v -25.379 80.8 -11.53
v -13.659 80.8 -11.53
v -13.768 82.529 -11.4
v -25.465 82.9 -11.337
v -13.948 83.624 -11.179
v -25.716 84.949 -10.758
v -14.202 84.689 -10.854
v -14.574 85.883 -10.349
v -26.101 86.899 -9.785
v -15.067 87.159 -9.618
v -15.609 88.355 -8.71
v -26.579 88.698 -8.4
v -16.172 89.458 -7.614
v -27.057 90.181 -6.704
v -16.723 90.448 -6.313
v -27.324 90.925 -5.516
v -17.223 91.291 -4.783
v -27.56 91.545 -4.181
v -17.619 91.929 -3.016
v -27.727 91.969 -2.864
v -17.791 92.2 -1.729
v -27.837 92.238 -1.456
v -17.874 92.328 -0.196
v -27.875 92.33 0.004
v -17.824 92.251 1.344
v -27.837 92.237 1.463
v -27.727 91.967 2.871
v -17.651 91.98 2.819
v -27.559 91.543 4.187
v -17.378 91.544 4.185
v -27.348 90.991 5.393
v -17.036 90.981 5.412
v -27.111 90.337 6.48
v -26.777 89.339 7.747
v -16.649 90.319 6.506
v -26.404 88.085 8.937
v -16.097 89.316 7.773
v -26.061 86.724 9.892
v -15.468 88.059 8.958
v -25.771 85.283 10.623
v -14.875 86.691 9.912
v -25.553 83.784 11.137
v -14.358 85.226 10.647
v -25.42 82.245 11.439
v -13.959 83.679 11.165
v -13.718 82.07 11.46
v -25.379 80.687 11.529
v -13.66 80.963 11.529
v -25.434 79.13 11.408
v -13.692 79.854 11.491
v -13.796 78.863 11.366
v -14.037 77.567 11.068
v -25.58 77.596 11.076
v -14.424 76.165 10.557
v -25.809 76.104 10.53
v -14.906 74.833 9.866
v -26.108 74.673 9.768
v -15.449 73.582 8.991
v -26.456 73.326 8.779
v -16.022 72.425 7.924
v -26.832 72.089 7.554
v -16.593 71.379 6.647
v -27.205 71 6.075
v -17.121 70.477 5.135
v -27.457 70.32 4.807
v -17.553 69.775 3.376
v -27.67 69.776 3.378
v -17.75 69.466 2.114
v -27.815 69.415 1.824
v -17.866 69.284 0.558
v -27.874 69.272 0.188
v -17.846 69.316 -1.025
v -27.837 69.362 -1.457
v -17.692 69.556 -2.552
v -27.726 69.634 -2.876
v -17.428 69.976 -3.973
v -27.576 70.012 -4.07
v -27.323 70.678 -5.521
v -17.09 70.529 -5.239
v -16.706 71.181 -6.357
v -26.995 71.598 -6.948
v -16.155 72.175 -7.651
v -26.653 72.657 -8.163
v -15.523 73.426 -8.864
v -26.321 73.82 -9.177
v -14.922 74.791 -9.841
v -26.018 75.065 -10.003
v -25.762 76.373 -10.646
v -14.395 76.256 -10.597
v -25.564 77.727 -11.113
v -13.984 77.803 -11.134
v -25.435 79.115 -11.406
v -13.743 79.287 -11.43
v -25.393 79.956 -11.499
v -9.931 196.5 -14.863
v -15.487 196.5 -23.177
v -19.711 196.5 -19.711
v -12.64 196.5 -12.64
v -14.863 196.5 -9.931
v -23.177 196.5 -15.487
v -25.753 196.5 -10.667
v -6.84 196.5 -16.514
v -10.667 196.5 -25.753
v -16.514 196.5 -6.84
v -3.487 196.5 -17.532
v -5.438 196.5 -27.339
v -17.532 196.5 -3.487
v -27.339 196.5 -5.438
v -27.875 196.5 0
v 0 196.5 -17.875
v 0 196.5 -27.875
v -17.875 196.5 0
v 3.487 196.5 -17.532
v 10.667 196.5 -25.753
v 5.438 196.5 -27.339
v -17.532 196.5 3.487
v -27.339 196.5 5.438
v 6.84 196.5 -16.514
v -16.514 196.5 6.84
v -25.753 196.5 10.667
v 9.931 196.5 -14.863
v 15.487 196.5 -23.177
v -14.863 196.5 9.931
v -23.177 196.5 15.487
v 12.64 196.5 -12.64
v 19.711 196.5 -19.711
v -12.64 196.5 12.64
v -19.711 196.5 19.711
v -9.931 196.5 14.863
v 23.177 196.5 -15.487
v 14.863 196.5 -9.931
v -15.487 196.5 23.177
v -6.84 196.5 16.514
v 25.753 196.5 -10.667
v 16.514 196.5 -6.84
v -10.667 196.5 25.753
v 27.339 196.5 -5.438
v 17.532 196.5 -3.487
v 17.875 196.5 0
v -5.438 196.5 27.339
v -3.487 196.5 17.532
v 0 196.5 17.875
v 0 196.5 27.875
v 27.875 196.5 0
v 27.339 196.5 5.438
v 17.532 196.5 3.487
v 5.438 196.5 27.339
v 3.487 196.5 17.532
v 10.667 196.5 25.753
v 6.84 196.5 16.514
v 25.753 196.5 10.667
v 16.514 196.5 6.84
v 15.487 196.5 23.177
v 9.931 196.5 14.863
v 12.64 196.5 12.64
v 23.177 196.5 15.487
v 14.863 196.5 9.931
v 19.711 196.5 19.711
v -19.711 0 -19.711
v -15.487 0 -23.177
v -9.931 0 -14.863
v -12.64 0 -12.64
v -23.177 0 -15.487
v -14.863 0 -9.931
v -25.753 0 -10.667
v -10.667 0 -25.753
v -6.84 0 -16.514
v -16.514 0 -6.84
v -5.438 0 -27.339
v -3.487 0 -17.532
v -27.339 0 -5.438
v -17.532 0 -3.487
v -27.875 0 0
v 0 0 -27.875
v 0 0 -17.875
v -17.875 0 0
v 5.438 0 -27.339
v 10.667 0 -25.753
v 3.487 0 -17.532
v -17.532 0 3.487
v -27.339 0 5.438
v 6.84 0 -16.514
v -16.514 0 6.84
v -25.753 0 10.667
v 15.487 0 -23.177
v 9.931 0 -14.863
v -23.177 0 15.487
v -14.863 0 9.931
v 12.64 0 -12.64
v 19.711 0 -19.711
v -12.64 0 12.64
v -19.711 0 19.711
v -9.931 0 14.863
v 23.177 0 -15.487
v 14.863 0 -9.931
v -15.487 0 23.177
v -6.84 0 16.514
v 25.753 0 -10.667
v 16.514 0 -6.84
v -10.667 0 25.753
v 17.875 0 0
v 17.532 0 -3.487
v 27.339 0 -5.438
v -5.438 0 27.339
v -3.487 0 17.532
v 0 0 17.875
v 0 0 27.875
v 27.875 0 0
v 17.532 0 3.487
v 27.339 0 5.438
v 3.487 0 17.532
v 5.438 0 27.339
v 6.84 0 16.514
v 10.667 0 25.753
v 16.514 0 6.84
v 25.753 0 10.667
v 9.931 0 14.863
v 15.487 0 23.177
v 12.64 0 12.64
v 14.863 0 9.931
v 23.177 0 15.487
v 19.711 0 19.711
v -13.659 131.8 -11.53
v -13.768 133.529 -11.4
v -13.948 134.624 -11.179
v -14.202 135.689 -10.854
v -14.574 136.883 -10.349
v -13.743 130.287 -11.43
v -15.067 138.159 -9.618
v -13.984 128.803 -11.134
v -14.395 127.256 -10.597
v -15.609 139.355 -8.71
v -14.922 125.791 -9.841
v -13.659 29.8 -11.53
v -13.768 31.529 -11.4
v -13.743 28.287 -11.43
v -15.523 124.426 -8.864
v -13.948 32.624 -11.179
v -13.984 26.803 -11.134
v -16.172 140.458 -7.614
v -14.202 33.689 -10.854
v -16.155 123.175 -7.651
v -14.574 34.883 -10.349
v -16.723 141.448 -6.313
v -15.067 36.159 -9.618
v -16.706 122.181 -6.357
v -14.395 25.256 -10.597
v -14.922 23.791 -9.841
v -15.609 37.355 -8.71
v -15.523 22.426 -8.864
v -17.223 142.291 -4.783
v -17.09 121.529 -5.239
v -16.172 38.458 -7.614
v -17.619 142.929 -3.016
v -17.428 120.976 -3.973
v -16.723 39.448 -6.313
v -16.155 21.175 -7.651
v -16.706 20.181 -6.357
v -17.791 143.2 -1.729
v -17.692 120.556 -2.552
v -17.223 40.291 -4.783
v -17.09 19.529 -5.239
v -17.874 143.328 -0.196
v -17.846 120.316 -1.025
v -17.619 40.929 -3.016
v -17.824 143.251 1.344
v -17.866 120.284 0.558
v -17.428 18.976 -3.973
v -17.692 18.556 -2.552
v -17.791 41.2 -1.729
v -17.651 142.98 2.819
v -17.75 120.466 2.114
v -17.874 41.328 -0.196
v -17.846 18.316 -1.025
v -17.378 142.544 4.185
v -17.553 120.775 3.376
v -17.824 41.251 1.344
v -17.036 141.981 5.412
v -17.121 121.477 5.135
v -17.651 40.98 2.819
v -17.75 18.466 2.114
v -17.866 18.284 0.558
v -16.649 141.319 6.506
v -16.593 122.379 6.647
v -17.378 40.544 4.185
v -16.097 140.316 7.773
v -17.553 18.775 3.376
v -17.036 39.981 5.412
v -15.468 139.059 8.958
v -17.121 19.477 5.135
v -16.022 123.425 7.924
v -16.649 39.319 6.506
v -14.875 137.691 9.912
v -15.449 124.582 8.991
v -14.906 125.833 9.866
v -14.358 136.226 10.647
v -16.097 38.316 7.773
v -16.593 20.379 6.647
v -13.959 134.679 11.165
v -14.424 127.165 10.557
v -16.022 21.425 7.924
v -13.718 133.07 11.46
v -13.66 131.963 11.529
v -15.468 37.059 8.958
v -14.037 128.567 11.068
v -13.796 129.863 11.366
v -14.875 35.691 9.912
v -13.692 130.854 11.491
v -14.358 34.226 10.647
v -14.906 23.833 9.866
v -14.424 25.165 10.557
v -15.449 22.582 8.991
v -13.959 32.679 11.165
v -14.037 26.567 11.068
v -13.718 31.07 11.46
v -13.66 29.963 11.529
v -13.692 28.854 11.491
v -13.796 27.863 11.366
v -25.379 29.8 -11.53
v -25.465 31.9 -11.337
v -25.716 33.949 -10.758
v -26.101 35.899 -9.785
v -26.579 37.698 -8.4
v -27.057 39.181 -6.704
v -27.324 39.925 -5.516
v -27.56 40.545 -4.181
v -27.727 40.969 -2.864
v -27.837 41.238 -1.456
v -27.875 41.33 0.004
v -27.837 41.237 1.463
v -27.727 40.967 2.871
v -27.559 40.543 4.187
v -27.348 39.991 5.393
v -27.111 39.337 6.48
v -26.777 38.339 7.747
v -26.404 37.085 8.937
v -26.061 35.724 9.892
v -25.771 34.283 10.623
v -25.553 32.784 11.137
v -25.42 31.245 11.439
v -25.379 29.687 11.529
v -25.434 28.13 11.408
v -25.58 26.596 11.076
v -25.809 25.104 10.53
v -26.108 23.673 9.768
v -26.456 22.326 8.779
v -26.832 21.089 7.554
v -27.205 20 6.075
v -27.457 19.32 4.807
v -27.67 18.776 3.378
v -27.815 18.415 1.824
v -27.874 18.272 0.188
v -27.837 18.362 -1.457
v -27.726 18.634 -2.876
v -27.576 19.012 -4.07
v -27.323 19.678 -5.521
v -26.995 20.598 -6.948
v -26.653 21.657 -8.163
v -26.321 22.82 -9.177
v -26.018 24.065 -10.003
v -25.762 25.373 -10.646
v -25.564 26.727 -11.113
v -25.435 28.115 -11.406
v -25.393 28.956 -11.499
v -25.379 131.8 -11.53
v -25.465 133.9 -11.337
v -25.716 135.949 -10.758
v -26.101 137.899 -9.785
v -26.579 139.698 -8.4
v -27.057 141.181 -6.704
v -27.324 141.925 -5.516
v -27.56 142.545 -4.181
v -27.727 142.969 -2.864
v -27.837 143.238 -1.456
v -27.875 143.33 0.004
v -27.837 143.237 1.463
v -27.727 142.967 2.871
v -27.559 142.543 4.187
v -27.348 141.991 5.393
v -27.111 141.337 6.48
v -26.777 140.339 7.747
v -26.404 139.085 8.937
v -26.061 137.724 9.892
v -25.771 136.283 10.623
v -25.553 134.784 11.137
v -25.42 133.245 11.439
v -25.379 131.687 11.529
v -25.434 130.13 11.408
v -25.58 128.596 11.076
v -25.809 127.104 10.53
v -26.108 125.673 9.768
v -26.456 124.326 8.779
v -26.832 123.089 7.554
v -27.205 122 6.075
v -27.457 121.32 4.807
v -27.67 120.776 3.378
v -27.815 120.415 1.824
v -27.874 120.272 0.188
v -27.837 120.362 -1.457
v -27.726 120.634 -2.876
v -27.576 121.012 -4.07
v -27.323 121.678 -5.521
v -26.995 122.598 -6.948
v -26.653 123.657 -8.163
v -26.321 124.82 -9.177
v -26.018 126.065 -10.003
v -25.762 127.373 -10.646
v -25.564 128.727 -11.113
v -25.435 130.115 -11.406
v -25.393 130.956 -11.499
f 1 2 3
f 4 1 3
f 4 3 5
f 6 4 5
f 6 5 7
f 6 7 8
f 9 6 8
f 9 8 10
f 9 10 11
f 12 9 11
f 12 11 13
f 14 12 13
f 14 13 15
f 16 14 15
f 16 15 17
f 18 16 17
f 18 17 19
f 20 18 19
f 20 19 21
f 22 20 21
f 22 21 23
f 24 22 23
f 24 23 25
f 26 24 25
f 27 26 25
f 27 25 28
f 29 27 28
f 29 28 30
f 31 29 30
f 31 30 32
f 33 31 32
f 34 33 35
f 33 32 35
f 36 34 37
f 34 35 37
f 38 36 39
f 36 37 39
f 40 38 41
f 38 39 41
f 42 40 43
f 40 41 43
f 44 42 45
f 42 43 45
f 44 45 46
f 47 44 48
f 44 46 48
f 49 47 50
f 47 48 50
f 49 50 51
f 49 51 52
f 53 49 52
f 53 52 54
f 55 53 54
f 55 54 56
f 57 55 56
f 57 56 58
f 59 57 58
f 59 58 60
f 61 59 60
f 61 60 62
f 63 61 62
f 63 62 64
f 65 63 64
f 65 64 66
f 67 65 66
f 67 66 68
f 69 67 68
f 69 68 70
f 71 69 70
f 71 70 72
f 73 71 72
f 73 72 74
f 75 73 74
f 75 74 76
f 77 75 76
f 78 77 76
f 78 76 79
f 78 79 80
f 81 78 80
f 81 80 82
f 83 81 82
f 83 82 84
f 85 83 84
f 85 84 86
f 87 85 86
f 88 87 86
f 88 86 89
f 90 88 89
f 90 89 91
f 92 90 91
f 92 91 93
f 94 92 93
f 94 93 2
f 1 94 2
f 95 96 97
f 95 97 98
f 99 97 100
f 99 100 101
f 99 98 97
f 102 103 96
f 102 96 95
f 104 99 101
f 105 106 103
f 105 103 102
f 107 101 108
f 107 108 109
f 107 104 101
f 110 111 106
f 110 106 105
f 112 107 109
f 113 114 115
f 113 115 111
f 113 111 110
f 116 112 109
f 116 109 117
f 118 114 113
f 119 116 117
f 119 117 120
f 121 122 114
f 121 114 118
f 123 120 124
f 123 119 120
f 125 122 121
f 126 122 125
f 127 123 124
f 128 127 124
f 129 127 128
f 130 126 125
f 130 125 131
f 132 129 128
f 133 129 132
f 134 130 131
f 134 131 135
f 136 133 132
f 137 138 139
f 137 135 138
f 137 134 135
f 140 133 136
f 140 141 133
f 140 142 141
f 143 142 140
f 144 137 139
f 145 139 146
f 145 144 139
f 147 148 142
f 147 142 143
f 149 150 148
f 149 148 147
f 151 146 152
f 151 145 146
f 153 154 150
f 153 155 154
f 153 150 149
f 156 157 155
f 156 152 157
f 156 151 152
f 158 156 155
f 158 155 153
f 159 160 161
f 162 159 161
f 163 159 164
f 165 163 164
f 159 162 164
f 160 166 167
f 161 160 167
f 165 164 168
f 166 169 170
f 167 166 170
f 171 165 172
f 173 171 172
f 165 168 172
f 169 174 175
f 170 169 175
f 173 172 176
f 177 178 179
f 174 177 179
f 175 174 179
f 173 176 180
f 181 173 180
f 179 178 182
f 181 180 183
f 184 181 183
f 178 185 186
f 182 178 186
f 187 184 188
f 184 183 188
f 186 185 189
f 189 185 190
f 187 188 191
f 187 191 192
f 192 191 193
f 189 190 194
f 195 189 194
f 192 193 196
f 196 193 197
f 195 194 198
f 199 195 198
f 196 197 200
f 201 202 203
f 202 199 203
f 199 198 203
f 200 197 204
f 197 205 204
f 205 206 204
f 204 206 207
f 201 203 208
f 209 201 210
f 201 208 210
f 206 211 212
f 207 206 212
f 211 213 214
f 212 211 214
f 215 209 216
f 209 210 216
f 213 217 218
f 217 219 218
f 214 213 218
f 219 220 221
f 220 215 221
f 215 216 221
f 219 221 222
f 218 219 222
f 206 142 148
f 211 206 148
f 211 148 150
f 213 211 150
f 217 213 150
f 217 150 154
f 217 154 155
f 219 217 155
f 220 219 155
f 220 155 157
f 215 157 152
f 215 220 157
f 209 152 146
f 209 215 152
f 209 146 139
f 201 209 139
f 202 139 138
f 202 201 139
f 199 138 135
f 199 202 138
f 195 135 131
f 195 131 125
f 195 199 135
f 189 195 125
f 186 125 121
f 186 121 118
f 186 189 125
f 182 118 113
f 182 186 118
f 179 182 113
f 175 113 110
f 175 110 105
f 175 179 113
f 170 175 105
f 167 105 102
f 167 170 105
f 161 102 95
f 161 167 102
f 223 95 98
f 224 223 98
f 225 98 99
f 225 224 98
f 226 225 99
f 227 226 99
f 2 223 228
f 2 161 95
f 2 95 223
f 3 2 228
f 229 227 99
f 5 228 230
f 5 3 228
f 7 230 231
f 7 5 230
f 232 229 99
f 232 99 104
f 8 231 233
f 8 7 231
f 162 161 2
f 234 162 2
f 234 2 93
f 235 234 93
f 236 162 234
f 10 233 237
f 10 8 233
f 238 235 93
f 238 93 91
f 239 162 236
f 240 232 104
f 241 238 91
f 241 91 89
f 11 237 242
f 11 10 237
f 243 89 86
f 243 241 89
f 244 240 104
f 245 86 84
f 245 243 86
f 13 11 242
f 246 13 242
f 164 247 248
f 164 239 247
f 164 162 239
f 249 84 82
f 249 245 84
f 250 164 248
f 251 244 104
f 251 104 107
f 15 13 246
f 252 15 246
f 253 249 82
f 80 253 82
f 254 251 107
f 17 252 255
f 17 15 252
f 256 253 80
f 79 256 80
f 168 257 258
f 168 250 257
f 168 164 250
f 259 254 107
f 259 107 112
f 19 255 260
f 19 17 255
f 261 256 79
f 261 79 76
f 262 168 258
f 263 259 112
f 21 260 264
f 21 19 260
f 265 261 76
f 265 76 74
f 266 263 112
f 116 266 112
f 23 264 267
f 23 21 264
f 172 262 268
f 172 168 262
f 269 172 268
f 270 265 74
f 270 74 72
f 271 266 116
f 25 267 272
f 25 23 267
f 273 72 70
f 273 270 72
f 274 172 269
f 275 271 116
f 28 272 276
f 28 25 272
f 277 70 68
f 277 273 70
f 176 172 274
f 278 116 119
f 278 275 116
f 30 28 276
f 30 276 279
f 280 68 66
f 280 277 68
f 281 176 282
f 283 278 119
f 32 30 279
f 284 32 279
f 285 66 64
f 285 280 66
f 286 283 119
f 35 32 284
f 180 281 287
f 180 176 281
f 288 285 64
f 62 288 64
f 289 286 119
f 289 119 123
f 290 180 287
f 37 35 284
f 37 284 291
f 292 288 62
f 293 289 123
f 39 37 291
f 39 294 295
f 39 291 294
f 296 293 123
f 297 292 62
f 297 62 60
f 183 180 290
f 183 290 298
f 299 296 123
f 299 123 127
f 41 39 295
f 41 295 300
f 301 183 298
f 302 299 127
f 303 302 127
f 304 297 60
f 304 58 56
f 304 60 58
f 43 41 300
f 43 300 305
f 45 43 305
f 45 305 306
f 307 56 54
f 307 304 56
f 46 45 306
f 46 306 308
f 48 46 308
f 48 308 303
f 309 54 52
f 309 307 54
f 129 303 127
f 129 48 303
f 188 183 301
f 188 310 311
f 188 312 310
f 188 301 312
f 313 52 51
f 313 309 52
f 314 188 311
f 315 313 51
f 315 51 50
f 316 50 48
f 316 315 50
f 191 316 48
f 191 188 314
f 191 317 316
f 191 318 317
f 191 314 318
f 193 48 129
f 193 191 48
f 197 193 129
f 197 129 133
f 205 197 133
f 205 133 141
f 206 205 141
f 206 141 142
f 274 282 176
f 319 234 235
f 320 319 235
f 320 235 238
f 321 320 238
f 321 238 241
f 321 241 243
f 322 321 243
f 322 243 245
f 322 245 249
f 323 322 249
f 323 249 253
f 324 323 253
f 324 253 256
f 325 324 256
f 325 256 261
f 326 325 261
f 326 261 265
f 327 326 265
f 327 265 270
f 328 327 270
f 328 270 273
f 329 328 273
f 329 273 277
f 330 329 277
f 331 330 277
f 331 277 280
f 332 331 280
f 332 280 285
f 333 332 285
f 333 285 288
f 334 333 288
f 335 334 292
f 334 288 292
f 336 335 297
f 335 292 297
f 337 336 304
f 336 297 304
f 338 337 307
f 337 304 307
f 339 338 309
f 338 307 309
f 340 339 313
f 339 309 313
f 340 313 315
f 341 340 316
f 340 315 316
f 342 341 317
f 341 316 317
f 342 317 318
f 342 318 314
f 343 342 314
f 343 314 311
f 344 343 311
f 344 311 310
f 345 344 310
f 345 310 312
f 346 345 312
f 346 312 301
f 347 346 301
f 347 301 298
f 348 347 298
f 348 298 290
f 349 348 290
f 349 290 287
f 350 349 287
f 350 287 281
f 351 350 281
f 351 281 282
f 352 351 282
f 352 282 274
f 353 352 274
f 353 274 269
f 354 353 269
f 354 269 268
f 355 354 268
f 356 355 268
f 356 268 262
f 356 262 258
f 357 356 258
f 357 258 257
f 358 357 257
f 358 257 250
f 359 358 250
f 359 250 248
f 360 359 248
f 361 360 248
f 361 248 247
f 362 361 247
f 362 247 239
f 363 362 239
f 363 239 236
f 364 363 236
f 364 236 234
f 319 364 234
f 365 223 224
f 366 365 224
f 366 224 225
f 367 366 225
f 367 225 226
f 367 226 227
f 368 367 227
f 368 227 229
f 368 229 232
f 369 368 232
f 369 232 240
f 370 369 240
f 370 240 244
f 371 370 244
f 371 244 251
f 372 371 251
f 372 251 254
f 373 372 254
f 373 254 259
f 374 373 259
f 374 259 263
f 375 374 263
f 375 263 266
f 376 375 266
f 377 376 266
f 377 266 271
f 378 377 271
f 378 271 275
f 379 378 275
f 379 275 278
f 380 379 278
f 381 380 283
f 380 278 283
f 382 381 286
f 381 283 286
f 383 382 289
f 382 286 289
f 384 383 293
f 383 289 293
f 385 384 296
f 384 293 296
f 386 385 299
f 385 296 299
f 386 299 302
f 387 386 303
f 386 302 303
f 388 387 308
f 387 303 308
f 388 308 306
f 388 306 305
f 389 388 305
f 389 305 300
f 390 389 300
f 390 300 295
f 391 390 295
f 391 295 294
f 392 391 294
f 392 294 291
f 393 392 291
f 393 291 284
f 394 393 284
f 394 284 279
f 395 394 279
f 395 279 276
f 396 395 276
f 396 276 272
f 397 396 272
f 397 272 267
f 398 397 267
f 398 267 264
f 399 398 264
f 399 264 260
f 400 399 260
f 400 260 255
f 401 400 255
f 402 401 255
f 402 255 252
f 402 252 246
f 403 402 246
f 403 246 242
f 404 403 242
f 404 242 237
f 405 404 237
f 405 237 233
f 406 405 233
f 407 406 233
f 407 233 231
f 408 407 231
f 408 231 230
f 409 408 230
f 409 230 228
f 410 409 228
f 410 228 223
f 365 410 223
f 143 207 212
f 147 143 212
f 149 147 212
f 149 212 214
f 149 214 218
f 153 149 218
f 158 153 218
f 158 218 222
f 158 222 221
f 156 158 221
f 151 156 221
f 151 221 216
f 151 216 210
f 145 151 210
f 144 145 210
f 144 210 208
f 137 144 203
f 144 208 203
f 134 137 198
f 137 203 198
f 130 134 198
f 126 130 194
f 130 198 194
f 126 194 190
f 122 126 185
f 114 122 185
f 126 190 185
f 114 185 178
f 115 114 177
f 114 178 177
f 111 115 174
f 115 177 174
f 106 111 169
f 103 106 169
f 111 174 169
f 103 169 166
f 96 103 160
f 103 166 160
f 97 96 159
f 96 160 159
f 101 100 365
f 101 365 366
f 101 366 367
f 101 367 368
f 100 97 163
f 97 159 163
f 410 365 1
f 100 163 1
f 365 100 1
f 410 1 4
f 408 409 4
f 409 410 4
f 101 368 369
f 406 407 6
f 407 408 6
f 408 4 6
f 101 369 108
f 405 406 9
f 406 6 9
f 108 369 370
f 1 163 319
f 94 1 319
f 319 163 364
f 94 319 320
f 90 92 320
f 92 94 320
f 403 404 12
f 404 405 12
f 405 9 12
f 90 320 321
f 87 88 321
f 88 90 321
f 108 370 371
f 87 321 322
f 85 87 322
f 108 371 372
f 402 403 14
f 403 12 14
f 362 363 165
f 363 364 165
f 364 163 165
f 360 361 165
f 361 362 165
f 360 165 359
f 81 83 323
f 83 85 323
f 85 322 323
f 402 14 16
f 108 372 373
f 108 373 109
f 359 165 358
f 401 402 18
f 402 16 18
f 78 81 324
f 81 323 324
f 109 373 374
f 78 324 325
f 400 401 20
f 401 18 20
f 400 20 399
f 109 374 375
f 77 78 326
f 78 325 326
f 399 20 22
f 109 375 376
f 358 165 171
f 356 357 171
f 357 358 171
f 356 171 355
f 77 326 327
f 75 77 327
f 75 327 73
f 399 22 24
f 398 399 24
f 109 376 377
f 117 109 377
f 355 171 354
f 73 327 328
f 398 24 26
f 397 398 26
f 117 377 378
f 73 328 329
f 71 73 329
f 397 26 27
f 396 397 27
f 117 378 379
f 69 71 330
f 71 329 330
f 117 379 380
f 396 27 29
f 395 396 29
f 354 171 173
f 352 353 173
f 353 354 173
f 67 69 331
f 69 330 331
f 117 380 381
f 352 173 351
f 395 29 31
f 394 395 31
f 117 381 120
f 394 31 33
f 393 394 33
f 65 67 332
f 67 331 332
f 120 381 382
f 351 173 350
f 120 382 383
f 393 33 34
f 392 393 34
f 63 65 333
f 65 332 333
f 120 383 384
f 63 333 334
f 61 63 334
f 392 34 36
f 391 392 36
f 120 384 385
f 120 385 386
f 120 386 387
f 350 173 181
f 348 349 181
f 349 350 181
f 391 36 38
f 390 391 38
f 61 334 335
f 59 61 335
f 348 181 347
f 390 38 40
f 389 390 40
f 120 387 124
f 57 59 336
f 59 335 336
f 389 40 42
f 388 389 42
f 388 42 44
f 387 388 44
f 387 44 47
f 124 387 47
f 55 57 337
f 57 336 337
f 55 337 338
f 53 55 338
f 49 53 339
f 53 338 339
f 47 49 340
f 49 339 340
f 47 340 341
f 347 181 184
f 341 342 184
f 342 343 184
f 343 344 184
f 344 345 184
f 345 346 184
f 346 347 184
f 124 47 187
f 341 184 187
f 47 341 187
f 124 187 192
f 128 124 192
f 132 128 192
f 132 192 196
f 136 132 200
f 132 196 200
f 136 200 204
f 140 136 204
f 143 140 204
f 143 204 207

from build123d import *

# Parameters (mm, degrees)
SKETCH1_R           = 27.875
SKETCH1_R_2         = 17.875
BOSS_EXTRUDE1_DEPTH = 196.5
SKETCH2_R           = 11.53
CUT_EXTRUDE1_DEPTH  = 201.415271998


with BuildPart() as part:
    # Sketch1 → Boss-Extrude1 (new body)
    with BuildSketch(Plane(origin=(0, 0, 0), x_dir=(1, 0, 0), z_dir=(0, 1, 0))):
        with Locations(Location((0, 0, 0), (0, 0, 270))):
            Circle(SKETCH1_R)
        with Locations(Location((0, 0, 0), (0, 0, 270))):
            Circle(SKETCH1_R_2, mode=Mode.SUBTRACT)
    extrude(amount=BOSS_EXTRUDE1_DEPTH)

    # Sketch2 → Cut-Extrude1 (cut, through all)
    with BuildSketch(Plane(origin=(0, 0, 0), x_dir=(0, 0, -1), z_dir=(1, 0, 0))):
        with Locations((0, 131.8)):
            Circle(SKETCH2_R)
        with Locations((0, 80.8)):
            Circle(SKETCH2_R)
        with Locations((0, 29.8)):
            Circle(SKETCH2_R)
    extrude(amount=-CUT_EXTRUDE1_DEPTH, mode=Mode.SUBTRACT)


solid = part.part
